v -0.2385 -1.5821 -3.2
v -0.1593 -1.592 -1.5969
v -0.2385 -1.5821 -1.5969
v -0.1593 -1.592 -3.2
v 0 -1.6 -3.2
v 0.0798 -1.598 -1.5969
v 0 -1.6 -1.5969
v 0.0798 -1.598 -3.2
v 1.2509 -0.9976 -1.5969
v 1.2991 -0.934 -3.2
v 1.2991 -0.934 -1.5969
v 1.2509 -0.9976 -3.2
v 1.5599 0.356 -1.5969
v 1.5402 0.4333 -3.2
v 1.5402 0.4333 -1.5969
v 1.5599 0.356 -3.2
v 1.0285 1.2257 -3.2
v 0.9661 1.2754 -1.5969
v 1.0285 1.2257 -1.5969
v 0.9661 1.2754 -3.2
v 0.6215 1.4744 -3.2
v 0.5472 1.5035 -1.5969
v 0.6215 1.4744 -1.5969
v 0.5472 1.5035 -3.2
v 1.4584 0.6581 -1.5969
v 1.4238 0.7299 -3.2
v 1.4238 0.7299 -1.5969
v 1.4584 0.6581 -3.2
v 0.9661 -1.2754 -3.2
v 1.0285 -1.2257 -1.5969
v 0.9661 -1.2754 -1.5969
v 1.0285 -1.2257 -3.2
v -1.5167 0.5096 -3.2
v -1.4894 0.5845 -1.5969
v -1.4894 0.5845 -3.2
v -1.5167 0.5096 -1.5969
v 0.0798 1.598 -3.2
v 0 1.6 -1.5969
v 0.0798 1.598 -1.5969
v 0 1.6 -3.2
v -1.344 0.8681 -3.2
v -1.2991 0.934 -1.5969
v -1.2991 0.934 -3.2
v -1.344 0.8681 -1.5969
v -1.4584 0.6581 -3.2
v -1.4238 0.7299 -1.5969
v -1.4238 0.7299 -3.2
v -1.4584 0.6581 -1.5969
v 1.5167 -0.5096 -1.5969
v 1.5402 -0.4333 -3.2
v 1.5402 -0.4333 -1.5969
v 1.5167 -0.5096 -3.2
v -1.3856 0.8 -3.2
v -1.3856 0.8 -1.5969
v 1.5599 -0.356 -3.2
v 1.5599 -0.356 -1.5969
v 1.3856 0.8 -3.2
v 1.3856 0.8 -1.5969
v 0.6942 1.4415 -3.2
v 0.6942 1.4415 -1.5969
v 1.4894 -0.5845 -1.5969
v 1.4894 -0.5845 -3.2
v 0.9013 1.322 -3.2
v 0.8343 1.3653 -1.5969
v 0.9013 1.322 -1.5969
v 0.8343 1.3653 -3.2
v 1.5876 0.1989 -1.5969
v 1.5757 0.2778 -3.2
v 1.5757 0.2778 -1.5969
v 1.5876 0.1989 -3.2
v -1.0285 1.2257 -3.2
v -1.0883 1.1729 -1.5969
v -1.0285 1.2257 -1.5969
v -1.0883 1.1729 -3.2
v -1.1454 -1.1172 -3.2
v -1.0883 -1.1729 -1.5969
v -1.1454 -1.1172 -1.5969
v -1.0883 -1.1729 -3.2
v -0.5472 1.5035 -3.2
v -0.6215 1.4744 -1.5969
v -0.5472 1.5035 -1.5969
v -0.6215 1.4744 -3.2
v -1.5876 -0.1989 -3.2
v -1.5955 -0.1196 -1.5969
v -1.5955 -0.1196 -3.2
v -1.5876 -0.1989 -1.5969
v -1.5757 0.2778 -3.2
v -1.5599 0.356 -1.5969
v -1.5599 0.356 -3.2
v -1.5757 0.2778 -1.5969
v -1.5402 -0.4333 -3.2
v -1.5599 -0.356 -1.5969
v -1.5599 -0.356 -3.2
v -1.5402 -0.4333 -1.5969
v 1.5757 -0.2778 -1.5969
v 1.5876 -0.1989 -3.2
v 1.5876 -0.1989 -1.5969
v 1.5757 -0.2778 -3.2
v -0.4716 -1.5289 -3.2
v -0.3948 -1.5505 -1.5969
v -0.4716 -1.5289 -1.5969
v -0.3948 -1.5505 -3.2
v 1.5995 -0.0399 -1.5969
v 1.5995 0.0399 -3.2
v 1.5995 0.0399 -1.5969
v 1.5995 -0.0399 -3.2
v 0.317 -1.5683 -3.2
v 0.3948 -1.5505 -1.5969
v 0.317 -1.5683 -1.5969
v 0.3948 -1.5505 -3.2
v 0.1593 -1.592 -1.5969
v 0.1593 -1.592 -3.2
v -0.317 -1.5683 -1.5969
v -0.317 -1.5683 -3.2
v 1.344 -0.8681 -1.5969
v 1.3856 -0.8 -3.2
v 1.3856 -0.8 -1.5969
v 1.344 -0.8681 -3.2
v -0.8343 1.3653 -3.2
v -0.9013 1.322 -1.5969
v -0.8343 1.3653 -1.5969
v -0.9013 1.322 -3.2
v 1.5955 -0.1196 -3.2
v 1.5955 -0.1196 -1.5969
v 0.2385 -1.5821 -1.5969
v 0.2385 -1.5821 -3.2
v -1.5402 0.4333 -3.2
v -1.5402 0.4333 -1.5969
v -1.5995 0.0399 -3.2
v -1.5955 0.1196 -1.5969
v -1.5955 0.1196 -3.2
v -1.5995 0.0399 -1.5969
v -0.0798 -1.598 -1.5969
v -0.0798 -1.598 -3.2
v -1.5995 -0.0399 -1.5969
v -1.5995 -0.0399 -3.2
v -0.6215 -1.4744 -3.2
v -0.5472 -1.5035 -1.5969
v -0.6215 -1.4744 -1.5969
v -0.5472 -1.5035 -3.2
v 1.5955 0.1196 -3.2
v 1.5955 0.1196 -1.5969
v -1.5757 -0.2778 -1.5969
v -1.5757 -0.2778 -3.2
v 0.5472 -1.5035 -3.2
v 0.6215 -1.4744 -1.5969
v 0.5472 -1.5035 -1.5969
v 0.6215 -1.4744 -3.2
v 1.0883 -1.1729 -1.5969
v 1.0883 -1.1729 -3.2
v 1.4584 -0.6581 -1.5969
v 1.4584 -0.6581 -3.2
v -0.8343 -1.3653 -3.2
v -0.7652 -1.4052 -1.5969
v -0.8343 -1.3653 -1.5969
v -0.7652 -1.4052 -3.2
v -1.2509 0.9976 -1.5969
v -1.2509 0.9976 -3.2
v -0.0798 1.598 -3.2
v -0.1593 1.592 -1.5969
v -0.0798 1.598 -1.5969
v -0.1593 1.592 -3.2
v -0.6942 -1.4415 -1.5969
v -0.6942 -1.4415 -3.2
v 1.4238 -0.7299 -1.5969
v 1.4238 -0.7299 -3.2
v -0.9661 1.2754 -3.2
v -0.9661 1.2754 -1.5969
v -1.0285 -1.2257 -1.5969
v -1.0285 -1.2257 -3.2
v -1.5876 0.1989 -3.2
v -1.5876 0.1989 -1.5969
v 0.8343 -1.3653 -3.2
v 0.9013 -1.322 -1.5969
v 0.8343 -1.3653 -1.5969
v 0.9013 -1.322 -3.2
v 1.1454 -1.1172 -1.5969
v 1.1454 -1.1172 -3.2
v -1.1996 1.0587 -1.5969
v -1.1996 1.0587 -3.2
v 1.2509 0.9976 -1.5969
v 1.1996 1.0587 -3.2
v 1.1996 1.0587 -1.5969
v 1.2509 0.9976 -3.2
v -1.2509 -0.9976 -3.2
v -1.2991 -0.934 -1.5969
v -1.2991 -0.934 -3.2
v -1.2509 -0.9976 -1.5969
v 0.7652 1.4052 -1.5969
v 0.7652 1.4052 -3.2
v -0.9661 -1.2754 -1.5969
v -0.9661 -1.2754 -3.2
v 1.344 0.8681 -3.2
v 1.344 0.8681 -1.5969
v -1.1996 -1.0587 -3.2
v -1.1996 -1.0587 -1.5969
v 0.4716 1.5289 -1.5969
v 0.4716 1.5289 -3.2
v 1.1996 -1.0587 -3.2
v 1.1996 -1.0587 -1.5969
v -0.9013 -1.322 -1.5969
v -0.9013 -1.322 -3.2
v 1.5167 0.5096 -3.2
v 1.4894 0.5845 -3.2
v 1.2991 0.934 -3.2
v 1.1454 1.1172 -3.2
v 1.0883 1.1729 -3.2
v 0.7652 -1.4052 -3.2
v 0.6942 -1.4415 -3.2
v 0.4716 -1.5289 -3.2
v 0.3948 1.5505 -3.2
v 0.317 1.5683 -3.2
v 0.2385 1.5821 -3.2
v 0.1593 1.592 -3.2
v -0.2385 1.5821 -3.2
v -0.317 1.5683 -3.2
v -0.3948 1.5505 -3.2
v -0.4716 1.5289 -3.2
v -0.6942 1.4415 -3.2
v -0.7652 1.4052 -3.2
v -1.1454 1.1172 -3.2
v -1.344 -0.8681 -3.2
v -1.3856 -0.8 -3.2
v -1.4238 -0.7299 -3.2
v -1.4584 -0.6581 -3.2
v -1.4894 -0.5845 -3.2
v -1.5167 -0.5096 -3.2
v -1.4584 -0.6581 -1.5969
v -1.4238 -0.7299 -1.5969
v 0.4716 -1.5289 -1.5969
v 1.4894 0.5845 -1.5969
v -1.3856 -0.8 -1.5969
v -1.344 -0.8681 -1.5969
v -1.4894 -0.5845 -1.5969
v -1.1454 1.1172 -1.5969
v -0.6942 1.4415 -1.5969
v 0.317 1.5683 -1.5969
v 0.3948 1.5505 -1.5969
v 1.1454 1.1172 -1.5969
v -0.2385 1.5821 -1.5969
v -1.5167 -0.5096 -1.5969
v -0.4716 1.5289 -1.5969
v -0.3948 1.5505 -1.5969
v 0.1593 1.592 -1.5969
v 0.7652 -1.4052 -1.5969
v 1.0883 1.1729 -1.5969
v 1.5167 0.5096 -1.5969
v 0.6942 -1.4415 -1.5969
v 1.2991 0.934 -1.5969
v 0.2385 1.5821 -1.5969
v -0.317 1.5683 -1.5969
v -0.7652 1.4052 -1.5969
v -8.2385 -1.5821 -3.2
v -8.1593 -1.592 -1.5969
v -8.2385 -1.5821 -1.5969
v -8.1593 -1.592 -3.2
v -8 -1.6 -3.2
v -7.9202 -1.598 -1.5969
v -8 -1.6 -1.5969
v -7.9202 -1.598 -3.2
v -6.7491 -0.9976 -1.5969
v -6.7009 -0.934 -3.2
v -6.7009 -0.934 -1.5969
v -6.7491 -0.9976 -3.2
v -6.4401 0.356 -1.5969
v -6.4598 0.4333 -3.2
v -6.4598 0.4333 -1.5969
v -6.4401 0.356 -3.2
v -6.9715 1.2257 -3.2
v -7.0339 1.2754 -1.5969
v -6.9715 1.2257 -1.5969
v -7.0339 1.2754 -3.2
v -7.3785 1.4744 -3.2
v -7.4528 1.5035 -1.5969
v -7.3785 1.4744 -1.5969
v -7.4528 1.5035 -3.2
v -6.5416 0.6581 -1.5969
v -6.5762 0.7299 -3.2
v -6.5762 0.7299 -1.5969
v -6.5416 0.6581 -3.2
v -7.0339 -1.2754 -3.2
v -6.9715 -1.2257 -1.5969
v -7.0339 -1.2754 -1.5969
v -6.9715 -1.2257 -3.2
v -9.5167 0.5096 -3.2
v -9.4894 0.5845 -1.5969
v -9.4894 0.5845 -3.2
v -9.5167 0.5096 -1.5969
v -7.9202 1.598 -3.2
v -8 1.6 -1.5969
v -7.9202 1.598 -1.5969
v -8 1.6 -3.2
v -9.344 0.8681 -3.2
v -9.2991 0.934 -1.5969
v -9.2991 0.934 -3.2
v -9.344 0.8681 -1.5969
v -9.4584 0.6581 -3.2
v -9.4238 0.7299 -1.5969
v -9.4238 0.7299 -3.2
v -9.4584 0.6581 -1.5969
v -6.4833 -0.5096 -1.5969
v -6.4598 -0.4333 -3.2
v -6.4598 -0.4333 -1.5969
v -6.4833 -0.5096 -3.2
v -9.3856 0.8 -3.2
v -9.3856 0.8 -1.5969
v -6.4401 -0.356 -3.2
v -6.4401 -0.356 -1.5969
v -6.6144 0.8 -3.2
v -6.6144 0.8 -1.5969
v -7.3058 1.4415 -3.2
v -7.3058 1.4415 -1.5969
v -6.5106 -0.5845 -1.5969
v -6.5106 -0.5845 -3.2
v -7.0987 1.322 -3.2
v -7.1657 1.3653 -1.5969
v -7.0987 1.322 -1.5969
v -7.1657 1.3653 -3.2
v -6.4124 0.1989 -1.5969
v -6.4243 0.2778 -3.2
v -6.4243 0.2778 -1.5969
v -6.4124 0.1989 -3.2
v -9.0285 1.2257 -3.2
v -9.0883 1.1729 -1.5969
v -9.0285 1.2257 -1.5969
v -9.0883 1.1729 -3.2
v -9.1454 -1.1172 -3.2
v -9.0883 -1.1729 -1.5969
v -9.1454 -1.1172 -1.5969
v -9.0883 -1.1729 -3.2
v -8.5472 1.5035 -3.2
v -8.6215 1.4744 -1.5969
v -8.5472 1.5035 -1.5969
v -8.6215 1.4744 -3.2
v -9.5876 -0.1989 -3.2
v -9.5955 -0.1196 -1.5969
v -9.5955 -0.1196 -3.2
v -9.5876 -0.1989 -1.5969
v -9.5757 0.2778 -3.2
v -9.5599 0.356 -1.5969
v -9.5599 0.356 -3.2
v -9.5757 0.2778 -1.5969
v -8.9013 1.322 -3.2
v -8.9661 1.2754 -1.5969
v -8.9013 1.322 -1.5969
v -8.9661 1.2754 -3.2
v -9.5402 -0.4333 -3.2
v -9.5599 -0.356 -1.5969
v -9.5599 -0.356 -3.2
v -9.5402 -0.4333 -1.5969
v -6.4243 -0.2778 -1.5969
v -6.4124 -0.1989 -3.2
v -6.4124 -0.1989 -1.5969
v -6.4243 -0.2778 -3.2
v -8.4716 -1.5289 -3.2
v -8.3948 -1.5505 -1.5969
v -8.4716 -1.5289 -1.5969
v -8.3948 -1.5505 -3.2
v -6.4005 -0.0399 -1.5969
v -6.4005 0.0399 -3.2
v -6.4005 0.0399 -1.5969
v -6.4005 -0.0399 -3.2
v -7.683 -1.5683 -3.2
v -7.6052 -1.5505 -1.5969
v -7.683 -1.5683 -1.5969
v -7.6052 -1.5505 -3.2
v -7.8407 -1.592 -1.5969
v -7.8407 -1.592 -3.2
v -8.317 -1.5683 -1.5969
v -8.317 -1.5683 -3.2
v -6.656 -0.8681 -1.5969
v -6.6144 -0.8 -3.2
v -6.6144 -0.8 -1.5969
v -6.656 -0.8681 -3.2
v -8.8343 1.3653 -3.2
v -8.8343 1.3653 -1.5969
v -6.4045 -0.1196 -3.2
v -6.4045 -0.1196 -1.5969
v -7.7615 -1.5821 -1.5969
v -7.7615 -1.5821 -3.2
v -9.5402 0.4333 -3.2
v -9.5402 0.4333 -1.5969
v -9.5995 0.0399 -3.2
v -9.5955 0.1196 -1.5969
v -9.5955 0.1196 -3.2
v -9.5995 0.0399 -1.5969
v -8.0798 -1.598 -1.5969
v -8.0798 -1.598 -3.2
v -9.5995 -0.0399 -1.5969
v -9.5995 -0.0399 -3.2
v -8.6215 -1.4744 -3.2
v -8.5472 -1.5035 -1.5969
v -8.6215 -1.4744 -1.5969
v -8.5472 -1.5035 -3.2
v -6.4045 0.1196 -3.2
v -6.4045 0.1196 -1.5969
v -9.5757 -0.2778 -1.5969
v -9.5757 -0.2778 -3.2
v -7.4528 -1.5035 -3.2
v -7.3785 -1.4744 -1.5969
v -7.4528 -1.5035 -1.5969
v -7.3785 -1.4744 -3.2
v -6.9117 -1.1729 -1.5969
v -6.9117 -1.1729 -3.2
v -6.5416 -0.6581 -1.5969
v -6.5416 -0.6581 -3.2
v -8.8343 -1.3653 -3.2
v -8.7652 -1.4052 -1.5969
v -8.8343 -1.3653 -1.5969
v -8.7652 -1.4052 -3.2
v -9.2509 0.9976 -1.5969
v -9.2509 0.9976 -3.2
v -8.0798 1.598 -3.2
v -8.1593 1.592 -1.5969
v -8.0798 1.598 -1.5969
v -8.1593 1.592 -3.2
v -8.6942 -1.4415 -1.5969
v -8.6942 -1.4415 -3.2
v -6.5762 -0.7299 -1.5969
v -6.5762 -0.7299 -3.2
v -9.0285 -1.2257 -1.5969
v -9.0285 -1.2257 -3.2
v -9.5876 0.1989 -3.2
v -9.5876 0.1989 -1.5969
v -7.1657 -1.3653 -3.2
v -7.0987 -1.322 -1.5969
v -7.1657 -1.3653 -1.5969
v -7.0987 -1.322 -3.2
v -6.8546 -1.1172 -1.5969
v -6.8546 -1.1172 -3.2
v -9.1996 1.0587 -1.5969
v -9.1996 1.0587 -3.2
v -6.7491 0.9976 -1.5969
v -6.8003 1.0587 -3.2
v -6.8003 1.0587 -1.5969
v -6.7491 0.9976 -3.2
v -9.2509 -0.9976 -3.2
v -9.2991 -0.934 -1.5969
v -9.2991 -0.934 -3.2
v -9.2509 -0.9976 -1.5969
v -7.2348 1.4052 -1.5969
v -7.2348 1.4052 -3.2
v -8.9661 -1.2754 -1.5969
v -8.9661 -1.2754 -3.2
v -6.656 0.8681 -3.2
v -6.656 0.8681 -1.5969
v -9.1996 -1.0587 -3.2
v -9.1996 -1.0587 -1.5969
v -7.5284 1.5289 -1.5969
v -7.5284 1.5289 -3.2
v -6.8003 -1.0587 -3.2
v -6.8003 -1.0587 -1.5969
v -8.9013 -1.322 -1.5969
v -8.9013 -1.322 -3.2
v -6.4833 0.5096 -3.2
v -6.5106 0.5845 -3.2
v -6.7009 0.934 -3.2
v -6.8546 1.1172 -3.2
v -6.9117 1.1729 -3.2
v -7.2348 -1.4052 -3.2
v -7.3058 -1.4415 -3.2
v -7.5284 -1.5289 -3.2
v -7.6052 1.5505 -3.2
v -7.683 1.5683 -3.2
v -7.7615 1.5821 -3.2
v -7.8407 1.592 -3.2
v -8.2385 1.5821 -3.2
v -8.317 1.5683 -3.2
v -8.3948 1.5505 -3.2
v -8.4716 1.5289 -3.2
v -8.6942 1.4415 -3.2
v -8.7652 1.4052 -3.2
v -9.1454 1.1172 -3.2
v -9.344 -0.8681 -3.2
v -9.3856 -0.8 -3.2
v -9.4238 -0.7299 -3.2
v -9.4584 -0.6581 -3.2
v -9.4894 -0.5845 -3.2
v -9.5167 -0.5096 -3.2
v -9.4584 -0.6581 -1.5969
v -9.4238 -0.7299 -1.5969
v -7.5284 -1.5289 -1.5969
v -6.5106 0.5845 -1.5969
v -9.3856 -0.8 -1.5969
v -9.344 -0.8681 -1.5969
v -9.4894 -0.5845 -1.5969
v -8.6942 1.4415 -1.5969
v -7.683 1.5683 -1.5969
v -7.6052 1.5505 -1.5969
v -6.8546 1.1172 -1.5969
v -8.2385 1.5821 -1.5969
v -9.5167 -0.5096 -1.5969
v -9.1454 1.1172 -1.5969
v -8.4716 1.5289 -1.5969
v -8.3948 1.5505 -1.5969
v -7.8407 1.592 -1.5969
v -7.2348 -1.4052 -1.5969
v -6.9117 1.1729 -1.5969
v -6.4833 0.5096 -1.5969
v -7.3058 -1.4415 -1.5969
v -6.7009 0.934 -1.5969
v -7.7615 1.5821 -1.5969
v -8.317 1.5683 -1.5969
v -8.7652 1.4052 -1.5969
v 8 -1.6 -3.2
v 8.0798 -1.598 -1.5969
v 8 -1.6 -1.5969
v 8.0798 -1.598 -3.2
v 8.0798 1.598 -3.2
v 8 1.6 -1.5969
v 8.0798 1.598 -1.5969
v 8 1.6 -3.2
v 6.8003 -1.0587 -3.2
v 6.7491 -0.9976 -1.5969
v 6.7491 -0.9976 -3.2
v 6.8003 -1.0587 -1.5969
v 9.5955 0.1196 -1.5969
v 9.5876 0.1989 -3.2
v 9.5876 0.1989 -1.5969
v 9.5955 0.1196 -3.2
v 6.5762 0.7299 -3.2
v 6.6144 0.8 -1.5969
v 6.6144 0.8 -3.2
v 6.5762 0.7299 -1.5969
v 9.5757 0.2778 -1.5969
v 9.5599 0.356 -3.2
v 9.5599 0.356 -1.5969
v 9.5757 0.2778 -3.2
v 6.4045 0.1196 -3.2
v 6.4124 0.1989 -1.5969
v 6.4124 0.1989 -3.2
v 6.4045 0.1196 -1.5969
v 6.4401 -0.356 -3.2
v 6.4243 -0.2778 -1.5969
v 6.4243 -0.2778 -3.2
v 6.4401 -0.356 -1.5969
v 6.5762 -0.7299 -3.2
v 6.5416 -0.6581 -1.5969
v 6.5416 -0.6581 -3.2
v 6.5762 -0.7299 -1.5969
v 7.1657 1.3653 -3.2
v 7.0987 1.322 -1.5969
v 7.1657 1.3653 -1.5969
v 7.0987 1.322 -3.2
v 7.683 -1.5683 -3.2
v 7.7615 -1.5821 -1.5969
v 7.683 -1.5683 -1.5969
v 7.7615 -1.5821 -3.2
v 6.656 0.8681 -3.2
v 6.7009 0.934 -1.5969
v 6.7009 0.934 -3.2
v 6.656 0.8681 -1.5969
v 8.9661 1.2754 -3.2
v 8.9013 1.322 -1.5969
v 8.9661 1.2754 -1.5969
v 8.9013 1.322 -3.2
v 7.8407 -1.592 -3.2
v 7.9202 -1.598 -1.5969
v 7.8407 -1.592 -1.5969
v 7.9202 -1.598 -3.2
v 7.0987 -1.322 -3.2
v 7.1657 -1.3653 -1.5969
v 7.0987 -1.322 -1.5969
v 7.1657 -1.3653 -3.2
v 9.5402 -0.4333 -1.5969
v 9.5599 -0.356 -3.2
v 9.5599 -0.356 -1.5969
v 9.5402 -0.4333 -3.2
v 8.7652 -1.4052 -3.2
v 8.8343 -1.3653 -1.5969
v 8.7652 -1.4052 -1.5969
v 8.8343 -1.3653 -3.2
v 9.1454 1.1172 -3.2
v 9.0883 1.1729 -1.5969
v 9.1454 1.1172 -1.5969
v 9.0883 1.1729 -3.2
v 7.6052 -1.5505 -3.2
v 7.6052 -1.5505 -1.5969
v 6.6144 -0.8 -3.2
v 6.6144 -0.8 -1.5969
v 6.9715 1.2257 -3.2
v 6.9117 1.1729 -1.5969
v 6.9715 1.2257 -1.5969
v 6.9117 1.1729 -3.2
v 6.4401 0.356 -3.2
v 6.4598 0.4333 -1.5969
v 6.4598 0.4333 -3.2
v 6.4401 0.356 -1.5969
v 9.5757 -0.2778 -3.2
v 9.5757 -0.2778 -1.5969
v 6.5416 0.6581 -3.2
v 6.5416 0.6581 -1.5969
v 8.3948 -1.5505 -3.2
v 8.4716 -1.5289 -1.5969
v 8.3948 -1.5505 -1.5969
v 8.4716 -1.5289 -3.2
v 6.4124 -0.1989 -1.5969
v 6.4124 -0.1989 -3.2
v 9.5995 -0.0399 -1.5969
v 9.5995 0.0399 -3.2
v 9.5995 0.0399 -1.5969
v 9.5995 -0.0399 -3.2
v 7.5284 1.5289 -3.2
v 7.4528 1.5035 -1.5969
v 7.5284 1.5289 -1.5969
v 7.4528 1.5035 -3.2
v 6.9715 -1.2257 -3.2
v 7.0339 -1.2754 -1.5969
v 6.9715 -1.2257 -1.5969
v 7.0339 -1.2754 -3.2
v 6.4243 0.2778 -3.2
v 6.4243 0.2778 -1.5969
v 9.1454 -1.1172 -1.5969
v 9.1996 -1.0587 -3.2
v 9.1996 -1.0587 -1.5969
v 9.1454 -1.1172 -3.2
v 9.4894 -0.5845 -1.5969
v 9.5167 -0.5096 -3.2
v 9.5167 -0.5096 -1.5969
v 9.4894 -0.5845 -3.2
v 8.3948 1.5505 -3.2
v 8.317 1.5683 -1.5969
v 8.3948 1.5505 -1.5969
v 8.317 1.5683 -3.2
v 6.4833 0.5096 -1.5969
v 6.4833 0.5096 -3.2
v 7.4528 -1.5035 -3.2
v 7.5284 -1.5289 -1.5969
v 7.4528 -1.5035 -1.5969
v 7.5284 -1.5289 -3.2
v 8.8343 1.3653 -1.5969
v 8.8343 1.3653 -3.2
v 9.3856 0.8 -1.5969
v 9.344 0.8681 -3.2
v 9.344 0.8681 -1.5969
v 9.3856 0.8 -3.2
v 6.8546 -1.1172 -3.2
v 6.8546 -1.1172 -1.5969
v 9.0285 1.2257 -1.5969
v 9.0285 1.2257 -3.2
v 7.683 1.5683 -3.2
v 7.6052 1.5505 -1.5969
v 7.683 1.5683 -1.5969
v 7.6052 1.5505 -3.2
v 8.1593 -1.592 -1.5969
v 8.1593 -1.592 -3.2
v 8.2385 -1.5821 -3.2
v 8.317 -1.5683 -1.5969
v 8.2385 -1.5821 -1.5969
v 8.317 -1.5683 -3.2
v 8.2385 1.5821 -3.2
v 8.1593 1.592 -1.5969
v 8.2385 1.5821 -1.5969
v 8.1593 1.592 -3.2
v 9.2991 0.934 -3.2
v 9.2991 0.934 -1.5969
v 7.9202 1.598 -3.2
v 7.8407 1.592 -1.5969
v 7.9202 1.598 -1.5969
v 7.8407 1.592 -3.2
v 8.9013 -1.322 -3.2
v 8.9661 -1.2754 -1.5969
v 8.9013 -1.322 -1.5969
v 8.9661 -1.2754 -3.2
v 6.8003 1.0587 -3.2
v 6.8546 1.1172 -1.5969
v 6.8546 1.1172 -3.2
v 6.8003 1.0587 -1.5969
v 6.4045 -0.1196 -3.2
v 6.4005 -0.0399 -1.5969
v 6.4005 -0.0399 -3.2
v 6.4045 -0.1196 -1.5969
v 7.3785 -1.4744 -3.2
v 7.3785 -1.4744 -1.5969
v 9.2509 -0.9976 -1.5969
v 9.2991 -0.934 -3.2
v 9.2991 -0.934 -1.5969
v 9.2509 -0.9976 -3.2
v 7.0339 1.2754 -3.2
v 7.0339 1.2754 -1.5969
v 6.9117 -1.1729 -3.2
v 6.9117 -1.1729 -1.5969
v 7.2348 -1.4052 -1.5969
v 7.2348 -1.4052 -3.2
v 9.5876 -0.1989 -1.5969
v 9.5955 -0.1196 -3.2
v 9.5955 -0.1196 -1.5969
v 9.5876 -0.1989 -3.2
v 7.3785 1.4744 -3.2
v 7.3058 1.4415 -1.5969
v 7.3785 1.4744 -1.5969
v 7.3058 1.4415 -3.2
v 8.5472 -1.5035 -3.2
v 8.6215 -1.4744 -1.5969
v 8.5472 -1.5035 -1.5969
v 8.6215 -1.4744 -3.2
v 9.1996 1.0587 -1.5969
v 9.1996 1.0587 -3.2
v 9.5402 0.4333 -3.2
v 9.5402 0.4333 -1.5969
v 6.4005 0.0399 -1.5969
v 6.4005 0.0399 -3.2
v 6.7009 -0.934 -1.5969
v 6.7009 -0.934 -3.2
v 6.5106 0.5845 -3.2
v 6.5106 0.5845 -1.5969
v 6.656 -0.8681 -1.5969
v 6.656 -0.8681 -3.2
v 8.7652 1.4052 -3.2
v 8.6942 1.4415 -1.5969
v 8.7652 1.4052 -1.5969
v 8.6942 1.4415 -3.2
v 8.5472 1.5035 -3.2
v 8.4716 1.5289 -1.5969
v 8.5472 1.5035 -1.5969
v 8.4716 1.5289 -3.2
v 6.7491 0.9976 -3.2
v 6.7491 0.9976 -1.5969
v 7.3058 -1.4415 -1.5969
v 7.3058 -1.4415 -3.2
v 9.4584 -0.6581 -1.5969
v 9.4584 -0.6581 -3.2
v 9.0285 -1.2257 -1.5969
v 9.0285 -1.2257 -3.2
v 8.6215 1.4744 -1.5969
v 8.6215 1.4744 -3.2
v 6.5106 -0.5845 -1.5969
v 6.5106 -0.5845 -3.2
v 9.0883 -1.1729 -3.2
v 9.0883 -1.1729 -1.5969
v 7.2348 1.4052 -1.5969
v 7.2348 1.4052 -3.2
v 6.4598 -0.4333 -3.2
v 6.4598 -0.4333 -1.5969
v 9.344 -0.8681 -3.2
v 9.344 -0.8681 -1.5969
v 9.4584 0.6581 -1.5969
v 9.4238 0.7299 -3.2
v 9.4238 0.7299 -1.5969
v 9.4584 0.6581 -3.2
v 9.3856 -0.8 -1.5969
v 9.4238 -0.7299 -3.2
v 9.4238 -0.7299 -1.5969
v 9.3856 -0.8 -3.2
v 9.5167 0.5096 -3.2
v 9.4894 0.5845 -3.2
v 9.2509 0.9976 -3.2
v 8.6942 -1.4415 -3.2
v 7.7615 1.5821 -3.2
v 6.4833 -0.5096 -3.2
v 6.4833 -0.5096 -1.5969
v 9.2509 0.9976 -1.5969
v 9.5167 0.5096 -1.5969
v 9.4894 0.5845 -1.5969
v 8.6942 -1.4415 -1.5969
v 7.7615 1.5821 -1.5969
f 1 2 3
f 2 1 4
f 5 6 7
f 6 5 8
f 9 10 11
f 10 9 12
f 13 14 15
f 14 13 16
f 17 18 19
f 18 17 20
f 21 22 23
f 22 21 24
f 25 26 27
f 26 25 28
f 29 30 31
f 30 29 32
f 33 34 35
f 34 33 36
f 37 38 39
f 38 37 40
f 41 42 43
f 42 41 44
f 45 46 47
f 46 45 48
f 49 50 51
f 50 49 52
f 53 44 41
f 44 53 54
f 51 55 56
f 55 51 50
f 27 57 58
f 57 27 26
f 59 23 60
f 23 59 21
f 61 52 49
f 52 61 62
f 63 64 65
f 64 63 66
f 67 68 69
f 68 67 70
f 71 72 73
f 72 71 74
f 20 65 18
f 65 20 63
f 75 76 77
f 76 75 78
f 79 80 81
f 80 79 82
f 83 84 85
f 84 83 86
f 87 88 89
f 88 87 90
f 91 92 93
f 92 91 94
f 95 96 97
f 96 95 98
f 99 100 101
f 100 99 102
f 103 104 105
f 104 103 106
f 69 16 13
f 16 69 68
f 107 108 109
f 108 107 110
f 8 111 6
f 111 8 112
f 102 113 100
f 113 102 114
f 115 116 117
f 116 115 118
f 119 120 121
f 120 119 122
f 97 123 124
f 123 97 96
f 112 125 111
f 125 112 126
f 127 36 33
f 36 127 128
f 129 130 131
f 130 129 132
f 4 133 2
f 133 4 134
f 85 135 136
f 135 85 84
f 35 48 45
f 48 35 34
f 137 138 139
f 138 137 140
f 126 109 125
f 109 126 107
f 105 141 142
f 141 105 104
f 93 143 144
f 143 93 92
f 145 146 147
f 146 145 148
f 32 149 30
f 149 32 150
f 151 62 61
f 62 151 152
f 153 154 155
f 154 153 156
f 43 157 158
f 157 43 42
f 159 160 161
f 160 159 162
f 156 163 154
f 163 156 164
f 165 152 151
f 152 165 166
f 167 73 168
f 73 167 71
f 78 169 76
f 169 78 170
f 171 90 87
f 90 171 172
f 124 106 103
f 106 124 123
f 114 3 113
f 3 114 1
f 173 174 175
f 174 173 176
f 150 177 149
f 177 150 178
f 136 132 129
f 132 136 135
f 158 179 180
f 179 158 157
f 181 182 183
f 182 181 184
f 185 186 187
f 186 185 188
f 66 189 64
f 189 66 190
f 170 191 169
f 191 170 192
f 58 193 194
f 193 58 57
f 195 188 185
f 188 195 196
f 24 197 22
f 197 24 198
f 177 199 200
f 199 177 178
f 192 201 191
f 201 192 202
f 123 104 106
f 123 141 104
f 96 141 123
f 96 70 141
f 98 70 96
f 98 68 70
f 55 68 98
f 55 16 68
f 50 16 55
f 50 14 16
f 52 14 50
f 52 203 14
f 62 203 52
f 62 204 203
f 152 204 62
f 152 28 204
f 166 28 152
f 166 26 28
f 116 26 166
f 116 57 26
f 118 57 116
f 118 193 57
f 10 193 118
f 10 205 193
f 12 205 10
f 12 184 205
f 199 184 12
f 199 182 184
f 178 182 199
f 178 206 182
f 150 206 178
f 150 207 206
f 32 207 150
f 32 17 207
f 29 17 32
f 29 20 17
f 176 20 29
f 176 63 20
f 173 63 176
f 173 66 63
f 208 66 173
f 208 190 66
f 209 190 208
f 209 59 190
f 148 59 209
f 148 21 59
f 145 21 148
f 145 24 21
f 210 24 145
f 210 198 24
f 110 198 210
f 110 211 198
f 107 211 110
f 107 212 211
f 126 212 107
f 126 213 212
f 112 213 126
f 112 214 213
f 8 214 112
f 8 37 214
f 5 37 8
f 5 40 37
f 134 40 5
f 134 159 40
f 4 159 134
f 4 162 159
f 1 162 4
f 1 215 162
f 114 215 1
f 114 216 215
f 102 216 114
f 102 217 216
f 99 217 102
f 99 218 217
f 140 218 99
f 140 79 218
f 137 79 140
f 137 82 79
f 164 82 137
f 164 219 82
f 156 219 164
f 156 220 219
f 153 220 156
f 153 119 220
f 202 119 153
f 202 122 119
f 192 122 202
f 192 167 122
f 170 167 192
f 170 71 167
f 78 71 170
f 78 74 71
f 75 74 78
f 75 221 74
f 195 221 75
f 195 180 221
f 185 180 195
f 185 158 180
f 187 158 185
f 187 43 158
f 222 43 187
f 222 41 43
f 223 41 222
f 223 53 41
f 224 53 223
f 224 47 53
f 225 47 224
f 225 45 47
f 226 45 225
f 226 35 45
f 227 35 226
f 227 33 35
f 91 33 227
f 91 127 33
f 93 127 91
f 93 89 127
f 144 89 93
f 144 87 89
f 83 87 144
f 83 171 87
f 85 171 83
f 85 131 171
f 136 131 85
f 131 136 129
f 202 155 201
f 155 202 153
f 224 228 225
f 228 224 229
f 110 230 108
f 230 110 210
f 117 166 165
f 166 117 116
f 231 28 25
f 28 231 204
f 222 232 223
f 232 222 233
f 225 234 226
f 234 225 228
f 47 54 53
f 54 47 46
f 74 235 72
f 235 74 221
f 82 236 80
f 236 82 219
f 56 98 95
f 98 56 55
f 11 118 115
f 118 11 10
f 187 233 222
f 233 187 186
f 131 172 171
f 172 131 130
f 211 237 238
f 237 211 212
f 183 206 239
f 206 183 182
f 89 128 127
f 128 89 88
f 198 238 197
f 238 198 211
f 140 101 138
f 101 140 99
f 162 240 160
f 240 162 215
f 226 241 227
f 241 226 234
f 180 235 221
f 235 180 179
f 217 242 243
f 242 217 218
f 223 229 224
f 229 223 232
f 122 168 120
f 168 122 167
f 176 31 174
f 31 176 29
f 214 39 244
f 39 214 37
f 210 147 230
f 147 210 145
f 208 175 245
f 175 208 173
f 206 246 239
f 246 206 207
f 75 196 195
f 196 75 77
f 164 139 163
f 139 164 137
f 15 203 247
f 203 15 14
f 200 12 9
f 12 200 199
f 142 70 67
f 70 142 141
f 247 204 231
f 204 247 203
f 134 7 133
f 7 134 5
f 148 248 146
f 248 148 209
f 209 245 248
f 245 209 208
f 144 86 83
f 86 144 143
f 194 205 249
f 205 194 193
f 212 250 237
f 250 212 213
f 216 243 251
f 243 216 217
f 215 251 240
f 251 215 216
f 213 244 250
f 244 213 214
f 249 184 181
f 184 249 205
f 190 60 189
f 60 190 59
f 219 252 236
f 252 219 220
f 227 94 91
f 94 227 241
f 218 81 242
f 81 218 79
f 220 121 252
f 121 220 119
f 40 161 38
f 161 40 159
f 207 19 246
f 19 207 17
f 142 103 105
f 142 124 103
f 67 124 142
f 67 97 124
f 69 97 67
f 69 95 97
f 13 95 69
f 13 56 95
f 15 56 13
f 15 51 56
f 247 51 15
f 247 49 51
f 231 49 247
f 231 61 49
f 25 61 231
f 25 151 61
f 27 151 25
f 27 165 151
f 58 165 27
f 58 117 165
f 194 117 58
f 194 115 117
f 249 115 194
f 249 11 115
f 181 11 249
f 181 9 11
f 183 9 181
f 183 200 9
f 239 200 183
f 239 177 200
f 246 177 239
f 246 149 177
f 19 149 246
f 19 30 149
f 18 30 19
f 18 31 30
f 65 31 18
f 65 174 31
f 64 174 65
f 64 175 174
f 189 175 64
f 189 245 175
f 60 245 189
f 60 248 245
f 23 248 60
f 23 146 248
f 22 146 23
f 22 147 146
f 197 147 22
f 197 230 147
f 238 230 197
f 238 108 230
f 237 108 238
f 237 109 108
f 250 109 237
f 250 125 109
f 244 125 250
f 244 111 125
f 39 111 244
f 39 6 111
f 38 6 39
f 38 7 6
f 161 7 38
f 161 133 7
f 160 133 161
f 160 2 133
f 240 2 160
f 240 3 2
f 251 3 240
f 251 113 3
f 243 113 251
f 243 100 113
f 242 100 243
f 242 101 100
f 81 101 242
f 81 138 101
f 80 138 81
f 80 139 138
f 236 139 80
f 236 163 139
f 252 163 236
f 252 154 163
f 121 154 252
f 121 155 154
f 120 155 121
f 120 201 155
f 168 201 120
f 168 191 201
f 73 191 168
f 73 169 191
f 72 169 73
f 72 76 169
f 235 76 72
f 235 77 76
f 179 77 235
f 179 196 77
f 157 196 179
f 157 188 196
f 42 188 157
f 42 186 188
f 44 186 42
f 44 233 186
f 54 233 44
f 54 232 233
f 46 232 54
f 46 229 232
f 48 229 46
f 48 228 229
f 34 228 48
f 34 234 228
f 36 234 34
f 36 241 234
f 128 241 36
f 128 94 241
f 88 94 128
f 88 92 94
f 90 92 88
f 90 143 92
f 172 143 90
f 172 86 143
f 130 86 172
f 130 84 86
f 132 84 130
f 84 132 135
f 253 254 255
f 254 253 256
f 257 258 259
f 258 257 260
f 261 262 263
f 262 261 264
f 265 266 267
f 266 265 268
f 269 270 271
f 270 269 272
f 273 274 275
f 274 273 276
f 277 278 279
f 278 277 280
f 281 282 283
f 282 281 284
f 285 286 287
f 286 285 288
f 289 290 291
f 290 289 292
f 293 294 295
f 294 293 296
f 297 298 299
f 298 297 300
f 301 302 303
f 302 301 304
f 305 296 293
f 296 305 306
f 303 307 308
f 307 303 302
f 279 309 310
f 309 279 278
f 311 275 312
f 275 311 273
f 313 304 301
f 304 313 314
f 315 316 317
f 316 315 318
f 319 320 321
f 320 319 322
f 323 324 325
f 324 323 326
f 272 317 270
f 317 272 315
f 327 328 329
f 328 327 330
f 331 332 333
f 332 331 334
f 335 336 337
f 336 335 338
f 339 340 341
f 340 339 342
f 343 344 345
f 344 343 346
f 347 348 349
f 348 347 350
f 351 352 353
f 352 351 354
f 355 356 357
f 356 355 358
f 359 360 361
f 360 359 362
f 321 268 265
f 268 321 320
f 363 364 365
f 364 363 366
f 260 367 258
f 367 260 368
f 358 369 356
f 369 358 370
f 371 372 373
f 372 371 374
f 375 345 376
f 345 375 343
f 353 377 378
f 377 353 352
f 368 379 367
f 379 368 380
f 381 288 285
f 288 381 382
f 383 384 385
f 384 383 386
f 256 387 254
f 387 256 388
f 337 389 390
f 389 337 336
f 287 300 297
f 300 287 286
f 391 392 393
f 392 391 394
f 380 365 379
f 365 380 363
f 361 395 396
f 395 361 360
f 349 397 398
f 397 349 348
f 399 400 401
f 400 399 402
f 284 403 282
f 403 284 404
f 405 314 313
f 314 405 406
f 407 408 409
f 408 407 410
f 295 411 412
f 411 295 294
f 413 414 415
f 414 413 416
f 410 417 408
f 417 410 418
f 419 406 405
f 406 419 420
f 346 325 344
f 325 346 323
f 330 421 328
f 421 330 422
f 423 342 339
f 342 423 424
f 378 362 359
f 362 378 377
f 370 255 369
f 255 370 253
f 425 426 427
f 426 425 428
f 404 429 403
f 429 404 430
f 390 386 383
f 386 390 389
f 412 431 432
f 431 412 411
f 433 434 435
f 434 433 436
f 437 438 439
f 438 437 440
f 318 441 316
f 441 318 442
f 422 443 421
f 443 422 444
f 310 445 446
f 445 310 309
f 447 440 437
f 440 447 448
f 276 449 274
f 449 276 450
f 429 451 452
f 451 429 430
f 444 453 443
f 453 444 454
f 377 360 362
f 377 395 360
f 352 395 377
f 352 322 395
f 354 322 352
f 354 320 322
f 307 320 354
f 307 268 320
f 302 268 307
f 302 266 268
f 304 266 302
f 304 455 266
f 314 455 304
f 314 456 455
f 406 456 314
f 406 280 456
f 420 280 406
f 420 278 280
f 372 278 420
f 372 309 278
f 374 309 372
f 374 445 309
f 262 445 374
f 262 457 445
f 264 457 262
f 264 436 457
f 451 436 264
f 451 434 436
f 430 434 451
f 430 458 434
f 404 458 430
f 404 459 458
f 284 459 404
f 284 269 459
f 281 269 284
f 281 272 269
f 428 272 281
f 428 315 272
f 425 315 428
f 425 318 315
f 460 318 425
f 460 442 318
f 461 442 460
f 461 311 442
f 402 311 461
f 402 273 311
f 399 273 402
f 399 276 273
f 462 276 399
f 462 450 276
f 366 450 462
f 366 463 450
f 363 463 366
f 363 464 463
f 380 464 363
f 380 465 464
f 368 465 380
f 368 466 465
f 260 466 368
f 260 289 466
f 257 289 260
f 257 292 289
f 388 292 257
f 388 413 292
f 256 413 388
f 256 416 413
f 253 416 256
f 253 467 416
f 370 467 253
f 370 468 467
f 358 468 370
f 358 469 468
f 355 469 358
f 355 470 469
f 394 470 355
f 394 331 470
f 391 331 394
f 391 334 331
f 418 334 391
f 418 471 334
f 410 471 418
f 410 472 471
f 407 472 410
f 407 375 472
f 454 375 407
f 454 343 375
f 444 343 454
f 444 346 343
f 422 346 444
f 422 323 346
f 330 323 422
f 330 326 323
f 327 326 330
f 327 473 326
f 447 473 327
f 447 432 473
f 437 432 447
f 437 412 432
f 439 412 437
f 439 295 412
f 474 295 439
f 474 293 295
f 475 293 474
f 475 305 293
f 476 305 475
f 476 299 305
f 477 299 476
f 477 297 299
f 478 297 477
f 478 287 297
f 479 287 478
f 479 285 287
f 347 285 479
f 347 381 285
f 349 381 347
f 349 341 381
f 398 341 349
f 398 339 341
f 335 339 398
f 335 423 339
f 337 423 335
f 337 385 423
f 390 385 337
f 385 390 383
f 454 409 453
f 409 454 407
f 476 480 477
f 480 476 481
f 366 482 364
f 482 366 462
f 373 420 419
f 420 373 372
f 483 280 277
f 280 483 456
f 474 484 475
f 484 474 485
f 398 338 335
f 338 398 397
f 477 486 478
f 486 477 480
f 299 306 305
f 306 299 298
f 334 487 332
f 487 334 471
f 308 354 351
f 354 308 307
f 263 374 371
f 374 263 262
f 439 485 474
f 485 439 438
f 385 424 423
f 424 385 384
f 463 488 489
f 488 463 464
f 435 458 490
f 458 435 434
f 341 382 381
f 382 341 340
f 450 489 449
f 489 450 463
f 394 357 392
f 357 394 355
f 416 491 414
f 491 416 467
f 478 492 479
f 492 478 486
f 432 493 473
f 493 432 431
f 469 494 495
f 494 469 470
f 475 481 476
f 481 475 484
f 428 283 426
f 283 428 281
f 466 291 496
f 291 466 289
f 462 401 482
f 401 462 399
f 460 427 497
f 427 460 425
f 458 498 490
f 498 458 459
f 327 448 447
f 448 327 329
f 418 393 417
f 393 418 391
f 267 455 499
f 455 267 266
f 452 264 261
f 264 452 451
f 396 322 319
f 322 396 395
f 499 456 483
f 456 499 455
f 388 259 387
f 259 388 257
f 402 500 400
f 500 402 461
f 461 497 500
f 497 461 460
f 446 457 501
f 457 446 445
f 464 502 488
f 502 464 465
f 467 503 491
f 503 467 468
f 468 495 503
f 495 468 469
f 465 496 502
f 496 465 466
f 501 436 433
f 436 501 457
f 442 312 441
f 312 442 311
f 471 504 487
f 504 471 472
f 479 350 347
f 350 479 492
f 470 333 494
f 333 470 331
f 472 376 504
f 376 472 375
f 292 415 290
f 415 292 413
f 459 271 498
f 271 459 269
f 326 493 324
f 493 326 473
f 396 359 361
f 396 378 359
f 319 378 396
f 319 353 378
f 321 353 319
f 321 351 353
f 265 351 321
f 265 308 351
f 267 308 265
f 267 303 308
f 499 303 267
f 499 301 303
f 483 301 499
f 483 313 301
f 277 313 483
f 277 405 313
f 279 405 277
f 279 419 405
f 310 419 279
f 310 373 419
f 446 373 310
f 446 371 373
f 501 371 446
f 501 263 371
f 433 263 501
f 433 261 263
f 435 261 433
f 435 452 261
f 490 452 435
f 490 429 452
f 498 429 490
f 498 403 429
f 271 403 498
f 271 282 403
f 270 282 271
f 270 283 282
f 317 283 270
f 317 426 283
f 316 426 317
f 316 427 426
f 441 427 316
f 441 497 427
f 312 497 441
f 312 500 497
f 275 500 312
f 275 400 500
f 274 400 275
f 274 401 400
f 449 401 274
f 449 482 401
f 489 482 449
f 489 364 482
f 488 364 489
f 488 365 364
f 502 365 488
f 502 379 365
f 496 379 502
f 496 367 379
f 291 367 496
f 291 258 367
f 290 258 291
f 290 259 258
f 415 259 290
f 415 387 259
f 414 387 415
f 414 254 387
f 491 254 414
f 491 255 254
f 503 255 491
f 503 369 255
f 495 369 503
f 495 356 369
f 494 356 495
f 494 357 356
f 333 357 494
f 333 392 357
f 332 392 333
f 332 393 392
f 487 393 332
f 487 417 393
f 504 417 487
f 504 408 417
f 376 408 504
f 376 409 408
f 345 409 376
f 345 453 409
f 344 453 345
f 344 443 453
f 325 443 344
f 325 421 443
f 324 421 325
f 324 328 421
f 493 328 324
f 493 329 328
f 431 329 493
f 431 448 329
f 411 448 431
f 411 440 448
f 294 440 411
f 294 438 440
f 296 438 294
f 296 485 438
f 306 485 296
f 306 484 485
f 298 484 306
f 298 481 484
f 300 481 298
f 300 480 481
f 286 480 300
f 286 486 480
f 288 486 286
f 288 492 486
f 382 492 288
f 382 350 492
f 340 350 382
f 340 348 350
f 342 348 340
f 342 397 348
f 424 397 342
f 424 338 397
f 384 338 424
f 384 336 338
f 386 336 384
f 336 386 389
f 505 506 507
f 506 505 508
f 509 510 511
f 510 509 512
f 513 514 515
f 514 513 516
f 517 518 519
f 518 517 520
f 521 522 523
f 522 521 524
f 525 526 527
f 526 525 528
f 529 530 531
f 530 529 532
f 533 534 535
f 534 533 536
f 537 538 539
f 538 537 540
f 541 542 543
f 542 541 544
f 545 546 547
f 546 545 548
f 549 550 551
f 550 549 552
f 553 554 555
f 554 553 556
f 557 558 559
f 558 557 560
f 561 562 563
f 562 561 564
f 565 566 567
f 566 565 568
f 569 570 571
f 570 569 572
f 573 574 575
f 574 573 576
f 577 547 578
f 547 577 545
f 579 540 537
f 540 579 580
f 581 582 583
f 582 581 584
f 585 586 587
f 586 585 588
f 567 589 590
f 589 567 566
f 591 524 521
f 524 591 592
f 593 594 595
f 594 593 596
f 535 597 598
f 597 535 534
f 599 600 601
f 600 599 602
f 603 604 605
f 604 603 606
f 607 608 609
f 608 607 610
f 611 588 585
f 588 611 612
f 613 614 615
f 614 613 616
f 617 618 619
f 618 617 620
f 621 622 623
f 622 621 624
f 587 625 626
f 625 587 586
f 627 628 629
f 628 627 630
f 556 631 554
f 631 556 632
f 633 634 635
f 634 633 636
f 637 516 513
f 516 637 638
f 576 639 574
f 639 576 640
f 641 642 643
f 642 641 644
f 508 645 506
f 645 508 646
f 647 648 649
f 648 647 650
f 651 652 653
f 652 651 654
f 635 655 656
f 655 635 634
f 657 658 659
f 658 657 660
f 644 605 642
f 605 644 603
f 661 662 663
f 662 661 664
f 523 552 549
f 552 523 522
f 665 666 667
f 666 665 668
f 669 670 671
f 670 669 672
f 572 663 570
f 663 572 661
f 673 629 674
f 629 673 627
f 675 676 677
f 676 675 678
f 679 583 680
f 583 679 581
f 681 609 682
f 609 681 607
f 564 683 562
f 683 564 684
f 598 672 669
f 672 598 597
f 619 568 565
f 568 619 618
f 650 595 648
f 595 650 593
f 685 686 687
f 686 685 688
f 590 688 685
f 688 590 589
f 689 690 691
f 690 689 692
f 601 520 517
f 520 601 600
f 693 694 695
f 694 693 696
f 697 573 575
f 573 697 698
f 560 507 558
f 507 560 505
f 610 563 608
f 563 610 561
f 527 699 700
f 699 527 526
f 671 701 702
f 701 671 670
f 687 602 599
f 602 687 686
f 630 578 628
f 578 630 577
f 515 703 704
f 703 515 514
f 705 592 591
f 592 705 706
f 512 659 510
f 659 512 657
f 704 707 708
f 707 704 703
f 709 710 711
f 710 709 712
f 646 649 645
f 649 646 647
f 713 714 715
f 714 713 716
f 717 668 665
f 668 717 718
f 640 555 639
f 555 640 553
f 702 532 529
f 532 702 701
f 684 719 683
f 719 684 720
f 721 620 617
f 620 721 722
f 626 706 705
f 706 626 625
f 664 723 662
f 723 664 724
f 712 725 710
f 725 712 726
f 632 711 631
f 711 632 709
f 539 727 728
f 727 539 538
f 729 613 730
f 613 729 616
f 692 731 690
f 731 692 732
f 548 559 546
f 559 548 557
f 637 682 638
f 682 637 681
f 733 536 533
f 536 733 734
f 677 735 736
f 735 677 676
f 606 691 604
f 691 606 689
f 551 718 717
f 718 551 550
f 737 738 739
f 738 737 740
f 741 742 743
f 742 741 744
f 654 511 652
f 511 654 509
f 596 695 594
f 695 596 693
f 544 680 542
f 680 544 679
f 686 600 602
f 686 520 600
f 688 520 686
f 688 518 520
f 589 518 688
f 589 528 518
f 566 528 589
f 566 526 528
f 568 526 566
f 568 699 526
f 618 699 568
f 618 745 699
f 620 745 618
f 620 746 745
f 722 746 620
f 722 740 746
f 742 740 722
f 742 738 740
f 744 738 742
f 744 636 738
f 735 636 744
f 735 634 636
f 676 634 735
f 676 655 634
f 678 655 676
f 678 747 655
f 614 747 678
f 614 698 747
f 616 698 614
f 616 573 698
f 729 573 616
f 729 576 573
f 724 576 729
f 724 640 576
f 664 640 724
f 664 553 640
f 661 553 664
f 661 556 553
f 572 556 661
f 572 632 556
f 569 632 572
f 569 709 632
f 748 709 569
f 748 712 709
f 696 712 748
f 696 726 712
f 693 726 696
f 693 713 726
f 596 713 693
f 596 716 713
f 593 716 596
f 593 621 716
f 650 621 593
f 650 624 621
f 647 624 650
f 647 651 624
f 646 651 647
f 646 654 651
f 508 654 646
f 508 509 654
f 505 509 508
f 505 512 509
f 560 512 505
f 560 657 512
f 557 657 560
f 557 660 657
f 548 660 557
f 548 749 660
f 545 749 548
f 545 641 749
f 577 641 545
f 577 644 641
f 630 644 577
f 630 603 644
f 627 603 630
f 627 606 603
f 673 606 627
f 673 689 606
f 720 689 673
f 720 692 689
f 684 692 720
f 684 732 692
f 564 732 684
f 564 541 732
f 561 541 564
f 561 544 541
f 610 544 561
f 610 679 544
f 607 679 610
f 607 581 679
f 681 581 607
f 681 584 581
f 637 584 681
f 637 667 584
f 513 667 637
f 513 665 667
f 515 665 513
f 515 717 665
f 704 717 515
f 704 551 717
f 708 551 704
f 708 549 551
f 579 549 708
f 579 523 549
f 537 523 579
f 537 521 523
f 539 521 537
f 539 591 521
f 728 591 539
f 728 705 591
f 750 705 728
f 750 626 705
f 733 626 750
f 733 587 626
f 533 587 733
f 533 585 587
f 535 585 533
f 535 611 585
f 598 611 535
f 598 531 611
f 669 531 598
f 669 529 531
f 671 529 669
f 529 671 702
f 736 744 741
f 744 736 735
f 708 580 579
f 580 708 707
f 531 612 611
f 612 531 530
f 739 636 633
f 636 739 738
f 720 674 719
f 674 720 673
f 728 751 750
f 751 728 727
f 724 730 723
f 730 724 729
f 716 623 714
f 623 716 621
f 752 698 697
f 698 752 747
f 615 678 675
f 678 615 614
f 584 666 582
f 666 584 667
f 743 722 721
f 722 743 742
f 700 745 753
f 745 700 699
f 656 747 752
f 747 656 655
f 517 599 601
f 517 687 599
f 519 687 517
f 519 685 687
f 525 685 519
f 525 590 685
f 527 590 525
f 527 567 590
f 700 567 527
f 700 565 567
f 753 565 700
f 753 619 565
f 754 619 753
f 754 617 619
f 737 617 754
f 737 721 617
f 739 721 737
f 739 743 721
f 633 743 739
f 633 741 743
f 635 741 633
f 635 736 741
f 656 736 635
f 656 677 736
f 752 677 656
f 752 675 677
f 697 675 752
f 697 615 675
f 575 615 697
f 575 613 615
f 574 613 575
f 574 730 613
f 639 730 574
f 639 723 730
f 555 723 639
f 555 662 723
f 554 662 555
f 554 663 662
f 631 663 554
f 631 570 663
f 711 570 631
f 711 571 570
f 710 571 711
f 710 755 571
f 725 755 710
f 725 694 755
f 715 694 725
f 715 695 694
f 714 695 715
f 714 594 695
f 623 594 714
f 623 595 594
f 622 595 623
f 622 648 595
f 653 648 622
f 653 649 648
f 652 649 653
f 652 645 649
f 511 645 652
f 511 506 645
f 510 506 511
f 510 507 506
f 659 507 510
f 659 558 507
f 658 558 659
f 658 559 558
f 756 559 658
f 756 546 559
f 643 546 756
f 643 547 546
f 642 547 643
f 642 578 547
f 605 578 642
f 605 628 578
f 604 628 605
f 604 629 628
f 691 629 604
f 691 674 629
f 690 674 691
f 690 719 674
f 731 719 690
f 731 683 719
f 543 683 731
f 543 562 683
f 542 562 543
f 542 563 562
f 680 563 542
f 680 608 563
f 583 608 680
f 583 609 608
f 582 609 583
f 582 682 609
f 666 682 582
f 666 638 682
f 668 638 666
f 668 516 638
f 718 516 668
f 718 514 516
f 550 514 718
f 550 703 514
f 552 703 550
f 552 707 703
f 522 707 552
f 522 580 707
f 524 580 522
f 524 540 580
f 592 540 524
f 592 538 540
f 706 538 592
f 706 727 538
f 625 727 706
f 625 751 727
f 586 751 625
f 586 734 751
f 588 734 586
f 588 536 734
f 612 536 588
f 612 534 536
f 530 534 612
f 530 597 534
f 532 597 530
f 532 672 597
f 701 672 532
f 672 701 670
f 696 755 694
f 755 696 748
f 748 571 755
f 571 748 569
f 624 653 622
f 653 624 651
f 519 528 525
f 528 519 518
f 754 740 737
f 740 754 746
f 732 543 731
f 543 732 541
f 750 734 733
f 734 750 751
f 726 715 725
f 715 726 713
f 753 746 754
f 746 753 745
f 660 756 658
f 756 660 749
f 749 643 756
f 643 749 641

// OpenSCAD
use <../lib.scad>
use <2431.scad>
use <6074343l.scad>
$fa=1; $fs=0.2;
function ldraw_lib__2431d50(realsolid=false) = [
// 0 Tile  1 x  4 with White 'LATCH' and Exclamation Marks in Triangles Sticker
// 0 Name: 2431d50.dat
// 0 Author: Magnus Forsberg [MagFors]
// 0 !LDRAW_ORG Shortcut UPDATE 2015-02
// 0 !LICENSE Licensed under CC BY 2.0 and CC BY 4.0 : see CAreadme.txt
// 
// 0 BFC CERTIFY CCW
  [0,"BFC","CERTIFY"],
  [0,"BFC","CCW"],
// 
// 0 !KEYWORDS Set 70816, Spaceship
// 
// 0 !CMDLINE -c1
// 
// 0 !HISTORY 2015-12-30 [PTadmin] Official Update 2015-02
// 
// 
// 1 16 0 0 0 1 0 0 0 1 0 0 0 1 2431.dat
  [1,16,0,0,0,1,0,0,0,1,0,0,0,1, ldraw_lib__2431(realsolid)],
// 1 16 0 0 0 1 0 0 0 1 0 0 0 1 6074343l.dat
  [1,16,0,0,0,1,0,0,0,1,0,0,0,1, ldraw_lib__6074343l(realsolid)],
];
module ldraw_lib__2431d50(step=0, col=false, unit=2/5, alt=false, line=0.2, solid=!$preview)
    makepoly(ldraw_lib__2431d50(solid), step=step, col=col, unit=unit, alt=alt, line=line, solid=solid);
ldraw_lib__2431d50(line=0.2);
